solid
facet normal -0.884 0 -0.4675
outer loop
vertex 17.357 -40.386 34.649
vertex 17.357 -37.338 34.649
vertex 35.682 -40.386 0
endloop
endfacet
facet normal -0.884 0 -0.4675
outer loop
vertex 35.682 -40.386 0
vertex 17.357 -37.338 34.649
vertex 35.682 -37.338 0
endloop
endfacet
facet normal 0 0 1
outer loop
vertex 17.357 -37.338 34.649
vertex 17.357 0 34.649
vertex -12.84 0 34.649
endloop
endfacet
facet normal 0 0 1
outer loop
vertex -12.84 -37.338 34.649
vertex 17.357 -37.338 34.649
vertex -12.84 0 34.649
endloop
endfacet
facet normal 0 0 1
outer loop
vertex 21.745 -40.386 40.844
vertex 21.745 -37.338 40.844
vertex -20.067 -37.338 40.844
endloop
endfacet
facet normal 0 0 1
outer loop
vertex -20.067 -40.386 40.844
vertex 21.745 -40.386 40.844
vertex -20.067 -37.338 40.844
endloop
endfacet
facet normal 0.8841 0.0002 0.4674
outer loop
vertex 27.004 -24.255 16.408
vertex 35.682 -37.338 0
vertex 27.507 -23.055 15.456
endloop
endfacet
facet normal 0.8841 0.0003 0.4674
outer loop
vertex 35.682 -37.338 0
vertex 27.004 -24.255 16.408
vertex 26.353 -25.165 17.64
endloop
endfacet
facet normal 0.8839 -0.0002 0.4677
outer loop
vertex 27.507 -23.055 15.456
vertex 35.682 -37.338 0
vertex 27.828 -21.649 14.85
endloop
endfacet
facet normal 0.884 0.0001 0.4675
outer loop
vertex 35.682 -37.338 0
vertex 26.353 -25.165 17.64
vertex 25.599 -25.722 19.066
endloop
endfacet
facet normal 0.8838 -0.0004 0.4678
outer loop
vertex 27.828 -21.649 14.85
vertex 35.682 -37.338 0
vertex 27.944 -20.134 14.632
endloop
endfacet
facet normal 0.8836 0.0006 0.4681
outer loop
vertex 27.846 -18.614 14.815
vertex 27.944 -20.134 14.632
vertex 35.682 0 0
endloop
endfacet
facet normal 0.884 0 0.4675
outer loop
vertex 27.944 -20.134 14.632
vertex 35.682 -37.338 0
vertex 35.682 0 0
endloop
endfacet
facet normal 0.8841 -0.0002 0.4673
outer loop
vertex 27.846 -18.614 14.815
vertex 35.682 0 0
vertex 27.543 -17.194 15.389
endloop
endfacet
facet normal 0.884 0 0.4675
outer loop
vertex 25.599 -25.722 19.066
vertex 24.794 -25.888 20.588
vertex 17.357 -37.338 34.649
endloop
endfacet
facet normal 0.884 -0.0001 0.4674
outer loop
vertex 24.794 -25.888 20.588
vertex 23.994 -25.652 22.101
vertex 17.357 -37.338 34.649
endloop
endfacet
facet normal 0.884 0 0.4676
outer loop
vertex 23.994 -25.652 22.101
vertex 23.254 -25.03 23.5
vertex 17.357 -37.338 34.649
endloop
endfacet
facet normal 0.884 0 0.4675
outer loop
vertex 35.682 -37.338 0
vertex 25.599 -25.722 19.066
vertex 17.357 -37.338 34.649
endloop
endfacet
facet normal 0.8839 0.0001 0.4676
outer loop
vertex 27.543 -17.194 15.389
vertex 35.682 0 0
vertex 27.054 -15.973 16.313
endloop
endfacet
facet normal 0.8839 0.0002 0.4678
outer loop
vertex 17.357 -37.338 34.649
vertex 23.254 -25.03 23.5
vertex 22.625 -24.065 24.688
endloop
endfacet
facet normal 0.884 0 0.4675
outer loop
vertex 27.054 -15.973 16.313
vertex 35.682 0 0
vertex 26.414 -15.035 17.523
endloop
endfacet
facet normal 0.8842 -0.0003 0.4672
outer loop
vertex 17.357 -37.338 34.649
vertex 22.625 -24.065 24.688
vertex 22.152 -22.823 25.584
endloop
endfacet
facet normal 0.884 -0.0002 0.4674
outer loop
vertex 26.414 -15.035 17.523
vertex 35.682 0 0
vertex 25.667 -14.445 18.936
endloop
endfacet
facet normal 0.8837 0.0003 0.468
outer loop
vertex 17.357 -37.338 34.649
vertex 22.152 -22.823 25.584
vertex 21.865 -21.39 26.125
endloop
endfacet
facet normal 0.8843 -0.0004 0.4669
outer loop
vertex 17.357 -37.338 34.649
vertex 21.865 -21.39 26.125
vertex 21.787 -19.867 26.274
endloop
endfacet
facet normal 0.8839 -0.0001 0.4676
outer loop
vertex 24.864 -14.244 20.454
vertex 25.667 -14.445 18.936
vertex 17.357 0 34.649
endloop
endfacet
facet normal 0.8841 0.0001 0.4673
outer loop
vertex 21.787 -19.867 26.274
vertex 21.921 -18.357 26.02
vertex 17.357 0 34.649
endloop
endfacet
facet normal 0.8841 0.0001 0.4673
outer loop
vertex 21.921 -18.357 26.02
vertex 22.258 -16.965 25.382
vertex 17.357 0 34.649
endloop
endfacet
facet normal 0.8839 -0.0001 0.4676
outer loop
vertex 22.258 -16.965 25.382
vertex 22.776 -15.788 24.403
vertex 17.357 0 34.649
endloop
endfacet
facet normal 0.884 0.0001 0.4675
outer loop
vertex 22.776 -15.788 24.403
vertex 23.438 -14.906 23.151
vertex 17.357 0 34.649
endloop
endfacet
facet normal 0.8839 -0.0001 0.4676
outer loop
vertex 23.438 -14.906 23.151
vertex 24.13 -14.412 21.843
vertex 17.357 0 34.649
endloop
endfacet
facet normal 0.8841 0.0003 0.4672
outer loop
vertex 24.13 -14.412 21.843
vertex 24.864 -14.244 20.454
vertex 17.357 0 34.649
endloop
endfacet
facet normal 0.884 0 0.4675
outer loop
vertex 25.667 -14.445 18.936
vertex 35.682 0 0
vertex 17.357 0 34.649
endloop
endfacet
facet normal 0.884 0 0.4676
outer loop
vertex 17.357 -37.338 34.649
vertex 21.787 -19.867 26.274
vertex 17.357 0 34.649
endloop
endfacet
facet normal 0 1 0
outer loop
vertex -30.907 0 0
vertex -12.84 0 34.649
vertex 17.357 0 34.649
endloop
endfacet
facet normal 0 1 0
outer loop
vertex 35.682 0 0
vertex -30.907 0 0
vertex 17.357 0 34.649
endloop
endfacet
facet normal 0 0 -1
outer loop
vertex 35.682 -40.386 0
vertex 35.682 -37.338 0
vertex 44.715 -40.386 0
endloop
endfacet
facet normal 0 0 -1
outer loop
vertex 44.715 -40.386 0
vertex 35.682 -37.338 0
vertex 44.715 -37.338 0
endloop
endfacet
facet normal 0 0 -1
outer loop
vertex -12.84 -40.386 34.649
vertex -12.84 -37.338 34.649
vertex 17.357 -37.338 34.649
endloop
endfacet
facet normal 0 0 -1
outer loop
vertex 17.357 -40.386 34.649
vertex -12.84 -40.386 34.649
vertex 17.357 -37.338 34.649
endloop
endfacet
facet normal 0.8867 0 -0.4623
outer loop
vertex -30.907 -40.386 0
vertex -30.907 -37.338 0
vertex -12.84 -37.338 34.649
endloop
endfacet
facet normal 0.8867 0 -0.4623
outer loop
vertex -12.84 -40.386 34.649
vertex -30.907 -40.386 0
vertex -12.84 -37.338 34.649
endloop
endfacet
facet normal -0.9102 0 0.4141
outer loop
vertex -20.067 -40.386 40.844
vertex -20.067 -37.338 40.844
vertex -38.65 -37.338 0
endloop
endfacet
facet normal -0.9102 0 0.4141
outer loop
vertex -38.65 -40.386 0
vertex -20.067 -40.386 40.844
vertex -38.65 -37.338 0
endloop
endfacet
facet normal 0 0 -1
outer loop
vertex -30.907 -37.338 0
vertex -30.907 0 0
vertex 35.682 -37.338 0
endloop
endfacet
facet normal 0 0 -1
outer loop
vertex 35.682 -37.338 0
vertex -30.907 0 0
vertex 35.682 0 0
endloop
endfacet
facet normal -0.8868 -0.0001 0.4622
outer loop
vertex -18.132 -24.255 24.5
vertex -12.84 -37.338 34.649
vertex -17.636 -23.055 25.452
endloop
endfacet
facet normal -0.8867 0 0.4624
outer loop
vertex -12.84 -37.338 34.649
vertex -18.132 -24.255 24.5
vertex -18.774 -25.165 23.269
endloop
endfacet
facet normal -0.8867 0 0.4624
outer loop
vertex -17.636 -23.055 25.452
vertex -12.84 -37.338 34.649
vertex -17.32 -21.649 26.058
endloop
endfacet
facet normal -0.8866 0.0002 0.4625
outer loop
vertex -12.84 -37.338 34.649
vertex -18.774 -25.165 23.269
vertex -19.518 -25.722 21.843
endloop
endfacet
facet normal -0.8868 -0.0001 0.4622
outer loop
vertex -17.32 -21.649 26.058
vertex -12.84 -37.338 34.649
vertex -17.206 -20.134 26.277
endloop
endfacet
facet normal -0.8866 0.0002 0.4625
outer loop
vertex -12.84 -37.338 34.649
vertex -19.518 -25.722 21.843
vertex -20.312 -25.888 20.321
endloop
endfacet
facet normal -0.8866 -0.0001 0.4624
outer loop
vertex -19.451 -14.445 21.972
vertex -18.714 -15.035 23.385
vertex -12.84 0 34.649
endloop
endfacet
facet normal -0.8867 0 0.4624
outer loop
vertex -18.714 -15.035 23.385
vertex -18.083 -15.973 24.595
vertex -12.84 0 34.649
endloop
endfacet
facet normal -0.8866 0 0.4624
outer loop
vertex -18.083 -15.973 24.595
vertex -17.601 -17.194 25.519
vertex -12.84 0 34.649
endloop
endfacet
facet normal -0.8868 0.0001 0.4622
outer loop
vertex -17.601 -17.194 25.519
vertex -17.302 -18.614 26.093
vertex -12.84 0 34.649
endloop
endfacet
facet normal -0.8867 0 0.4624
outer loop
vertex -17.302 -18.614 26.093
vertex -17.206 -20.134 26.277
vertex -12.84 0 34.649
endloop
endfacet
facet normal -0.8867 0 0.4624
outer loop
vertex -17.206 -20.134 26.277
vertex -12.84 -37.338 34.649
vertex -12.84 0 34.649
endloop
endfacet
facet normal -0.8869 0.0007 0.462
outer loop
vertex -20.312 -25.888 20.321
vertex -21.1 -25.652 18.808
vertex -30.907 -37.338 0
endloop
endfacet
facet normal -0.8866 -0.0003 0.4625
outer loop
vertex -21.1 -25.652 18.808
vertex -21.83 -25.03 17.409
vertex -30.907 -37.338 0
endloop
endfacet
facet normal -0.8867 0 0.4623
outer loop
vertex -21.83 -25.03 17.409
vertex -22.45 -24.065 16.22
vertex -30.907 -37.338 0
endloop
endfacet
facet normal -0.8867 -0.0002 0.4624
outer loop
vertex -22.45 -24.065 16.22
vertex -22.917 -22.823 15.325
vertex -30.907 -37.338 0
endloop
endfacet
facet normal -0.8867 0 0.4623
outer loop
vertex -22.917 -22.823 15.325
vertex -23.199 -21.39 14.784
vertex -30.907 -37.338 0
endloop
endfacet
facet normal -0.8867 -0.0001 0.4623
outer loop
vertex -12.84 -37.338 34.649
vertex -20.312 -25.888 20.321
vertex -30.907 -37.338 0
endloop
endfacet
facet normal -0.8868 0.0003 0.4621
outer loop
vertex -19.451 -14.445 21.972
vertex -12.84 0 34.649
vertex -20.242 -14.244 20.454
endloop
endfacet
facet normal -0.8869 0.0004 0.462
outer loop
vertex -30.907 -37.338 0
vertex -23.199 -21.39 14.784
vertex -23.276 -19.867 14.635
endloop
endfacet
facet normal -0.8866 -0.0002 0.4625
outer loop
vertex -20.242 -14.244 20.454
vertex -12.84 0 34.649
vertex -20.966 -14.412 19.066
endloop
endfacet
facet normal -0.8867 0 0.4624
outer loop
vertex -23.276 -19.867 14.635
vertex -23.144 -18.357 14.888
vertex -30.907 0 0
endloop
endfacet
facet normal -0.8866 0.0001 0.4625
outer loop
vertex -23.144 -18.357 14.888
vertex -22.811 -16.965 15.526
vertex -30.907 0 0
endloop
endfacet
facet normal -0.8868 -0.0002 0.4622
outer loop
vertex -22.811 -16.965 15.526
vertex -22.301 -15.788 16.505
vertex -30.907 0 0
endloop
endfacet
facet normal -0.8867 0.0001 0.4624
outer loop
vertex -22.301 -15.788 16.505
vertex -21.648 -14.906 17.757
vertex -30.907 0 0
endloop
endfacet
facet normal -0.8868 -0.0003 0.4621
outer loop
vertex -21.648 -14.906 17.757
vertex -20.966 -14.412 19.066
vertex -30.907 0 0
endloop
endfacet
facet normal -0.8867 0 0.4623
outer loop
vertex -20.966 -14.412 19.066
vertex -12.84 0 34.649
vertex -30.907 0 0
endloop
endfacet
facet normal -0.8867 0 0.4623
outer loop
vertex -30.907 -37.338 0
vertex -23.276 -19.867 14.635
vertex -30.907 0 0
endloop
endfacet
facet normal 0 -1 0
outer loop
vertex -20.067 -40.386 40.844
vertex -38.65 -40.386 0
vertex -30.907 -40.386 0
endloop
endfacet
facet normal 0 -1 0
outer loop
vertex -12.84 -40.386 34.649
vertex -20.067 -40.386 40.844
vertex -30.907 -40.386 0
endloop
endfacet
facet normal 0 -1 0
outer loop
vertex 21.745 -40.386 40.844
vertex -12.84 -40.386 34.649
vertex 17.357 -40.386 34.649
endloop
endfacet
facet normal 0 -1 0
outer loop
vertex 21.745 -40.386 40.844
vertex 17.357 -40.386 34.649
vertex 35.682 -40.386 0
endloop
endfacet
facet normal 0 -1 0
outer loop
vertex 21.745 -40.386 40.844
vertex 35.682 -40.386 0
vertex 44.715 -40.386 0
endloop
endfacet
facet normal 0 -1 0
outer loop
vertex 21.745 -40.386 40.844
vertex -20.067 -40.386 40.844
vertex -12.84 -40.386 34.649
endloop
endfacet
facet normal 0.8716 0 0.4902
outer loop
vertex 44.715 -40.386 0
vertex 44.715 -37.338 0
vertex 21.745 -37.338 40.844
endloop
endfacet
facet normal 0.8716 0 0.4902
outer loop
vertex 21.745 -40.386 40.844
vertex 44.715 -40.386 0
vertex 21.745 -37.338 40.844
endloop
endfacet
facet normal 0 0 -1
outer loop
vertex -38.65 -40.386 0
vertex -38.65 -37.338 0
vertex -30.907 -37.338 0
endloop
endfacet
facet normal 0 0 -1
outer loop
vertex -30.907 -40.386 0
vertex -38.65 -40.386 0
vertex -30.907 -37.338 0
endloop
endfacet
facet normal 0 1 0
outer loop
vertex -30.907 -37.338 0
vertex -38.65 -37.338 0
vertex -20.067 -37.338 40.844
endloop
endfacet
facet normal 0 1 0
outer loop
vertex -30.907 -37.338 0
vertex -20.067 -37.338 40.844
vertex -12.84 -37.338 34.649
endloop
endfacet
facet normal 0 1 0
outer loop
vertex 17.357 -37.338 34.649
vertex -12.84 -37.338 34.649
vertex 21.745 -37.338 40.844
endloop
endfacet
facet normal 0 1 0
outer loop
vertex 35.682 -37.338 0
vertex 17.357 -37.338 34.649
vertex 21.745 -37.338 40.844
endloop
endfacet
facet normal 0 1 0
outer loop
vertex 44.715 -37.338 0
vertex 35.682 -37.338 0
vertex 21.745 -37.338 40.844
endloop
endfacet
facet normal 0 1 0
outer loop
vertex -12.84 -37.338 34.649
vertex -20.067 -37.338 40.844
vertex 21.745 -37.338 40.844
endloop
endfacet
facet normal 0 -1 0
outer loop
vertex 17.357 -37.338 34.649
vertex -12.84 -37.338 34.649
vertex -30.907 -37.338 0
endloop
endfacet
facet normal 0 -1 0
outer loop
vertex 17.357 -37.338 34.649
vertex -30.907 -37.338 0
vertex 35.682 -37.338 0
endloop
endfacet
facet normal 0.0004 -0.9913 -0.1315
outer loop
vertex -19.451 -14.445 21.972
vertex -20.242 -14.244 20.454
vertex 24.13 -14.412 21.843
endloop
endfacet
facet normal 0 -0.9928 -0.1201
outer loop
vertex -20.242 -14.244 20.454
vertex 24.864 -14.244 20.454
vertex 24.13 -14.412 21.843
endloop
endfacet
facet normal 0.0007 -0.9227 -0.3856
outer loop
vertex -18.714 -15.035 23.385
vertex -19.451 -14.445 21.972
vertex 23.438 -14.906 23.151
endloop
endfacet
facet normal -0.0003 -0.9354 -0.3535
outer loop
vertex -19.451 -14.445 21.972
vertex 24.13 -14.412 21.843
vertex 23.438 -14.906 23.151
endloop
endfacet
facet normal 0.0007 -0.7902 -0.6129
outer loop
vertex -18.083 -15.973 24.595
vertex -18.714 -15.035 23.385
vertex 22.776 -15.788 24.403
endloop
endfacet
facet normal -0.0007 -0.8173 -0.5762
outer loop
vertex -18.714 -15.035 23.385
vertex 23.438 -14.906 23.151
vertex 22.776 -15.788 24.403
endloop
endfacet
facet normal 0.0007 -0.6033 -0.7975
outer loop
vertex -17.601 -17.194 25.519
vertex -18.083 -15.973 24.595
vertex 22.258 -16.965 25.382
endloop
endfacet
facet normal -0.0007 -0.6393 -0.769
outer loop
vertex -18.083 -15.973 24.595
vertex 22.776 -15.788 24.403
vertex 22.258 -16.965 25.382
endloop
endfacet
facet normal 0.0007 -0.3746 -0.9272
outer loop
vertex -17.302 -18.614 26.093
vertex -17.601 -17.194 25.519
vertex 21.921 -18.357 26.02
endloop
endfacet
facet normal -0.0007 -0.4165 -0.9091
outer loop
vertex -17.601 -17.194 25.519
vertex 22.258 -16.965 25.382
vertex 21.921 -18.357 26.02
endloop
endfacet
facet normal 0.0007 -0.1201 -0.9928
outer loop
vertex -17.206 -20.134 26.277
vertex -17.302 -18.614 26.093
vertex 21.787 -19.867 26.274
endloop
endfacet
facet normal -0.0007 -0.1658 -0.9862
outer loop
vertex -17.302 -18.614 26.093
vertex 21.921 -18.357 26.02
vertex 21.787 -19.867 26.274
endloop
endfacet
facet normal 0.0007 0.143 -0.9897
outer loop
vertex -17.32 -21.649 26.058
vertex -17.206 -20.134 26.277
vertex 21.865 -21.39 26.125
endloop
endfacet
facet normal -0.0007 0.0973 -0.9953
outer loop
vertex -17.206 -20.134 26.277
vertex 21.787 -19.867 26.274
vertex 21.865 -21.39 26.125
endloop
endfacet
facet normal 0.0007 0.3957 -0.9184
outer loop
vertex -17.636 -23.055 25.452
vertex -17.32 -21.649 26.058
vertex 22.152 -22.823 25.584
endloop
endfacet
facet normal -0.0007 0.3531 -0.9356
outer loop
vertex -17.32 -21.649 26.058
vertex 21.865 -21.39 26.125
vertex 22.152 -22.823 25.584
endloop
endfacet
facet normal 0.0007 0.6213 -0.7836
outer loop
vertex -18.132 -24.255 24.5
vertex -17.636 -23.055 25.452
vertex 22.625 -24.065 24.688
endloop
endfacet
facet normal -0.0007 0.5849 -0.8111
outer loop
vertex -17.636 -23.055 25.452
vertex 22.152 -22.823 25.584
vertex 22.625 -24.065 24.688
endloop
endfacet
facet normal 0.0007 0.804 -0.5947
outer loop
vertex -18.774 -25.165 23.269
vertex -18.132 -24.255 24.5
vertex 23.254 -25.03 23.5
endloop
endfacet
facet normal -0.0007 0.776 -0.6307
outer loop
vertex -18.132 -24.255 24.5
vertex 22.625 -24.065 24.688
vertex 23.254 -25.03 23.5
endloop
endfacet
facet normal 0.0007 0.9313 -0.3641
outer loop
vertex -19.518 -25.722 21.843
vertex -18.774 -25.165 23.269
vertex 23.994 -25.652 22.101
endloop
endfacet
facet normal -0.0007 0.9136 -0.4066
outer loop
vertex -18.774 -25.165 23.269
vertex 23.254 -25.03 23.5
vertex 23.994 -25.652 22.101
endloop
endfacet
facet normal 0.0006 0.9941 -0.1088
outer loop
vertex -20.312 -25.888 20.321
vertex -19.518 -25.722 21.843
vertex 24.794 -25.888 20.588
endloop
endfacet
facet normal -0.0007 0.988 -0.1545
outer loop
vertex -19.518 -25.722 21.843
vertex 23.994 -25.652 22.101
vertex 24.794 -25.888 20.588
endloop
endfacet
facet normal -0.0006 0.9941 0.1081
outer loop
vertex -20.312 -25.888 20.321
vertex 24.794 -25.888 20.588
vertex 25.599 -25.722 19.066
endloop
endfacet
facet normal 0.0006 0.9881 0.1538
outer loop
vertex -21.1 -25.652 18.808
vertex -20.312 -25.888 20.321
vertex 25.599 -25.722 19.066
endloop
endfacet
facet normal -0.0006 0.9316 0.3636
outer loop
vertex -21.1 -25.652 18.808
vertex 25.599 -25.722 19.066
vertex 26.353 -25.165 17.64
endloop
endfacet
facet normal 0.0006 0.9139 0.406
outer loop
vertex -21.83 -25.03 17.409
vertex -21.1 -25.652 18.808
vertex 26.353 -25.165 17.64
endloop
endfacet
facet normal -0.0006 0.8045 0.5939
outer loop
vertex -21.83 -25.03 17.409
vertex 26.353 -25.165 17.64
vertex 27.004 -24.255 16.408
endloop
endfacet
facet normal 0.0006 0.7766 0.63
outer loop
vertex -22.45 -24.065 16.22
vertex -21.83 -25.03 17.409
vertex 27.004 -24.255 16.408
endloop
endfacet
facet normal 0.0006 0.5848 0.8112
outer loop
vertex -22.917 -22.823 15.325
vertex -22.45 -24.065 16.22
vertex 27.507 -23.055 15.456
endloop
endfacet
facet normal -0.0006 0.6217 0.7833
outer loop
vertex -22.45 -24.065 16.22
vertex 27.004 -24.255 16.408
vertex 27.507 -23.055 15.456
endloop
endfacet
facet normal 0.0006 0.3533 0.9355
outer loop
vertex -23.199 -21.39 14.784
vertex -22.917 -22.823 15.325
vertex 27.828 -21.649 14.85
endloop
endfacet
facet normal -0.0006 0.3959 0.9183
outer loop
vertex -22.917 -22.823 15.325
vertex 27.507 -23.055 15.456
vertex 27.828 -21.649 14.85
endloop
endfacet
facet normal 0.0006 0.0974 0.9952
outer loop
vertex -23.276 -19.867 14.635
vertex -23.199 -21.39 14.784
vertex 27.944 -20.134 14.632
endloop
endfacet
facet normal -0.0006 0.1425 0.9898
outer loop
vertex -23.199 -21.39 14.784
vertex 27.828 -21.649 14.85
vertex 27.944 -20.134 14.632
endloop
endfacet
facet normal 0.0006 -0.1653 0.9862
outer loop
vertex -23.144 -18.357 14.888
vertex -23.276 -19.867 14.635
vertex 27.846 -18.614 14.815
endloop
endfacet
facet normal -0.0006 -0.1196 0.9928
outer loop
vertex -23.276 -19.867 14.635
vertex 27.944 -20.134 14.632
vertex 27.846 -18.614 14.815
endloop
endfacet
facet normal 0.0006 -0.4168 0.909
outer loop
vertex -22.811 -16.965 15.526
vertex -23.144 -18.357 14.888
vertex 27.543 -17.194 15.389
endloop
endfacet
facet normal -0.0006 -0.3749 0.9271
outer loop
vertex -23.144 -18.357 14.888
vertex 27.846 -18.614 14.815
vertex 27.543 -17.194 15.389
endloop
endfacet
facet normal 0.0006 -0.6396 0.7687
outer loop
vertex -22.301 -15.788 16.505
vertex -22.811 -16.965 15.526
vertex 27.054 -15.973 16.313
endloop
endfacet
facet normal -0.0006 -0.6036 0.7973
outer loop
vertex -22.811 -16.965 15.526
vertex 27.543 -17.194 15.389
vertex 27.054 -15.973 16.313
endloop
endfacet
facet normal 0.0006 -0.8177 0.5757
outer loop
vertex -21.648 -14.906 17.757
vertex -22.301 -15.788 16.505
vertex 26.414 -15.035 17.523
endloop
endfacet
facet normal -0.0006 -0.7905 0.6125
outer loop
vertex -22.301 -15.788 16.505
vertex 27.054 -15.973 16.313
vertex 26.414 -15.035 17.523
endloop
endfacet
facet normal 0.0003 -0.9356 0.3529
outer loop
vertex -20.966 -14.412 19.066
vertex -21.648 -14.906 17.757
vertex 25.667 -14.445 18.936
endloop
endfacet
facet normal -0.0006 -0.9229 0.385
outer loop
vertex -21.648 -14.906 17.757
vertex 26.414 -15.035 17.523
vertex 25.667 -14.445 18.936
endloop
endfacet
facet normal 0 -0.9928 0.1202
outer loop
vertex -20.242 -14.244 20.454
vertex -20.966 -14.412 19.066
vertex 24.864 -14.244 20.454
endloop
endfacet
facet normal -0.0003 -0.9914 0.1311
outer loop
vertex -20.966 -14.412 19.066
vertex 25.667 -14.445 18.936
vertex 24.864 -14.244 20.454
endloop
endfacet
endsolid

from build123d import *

# Parameters (mm, degrees)
F1_DEPTH = 37.338
F2_R     = 5.822928
F3_DEPTH = 29.972
F5_DEPTH = 3.048


with BuildPart() as f1:
    # F0 (on Front) → F1 (new body)
    with BuildSketch(Plane.XZ):
        Polygon((-12.840316, 34.649491), (-30.907091, 0), (35.681881, 0), (17.357009, 34.649491), align=None)
    extrude(amount=F1_DEPTH)

    # F2 (on Right) → F3 (cut, symmetric)
    with BuildSketch(Plane.YZ):
        with Locations((-20.067023, 20.454168)):
            Circle(F2_R)
    extrude(amount=F3_DEPTH, both=True, mode=Mode.SUBTRACT)


with BuildPart() as f5:
    # F4 (on face) → F5 (new body)
    with BuildSketch(Plane.XZ.offset(37.338)):
        Polygon((-20.067025, 40.843815), (-38.649991, 0), (-30.907091, 0), (-12.840316, 34.649491), (17.357009, 34.649491), (35.681881, 0), (44.71527, 0), (21.744652, 40.843815), align=None)
    extrude(amount=F5_DEPTH)


solid = Compound([f1.part, f5.part])
